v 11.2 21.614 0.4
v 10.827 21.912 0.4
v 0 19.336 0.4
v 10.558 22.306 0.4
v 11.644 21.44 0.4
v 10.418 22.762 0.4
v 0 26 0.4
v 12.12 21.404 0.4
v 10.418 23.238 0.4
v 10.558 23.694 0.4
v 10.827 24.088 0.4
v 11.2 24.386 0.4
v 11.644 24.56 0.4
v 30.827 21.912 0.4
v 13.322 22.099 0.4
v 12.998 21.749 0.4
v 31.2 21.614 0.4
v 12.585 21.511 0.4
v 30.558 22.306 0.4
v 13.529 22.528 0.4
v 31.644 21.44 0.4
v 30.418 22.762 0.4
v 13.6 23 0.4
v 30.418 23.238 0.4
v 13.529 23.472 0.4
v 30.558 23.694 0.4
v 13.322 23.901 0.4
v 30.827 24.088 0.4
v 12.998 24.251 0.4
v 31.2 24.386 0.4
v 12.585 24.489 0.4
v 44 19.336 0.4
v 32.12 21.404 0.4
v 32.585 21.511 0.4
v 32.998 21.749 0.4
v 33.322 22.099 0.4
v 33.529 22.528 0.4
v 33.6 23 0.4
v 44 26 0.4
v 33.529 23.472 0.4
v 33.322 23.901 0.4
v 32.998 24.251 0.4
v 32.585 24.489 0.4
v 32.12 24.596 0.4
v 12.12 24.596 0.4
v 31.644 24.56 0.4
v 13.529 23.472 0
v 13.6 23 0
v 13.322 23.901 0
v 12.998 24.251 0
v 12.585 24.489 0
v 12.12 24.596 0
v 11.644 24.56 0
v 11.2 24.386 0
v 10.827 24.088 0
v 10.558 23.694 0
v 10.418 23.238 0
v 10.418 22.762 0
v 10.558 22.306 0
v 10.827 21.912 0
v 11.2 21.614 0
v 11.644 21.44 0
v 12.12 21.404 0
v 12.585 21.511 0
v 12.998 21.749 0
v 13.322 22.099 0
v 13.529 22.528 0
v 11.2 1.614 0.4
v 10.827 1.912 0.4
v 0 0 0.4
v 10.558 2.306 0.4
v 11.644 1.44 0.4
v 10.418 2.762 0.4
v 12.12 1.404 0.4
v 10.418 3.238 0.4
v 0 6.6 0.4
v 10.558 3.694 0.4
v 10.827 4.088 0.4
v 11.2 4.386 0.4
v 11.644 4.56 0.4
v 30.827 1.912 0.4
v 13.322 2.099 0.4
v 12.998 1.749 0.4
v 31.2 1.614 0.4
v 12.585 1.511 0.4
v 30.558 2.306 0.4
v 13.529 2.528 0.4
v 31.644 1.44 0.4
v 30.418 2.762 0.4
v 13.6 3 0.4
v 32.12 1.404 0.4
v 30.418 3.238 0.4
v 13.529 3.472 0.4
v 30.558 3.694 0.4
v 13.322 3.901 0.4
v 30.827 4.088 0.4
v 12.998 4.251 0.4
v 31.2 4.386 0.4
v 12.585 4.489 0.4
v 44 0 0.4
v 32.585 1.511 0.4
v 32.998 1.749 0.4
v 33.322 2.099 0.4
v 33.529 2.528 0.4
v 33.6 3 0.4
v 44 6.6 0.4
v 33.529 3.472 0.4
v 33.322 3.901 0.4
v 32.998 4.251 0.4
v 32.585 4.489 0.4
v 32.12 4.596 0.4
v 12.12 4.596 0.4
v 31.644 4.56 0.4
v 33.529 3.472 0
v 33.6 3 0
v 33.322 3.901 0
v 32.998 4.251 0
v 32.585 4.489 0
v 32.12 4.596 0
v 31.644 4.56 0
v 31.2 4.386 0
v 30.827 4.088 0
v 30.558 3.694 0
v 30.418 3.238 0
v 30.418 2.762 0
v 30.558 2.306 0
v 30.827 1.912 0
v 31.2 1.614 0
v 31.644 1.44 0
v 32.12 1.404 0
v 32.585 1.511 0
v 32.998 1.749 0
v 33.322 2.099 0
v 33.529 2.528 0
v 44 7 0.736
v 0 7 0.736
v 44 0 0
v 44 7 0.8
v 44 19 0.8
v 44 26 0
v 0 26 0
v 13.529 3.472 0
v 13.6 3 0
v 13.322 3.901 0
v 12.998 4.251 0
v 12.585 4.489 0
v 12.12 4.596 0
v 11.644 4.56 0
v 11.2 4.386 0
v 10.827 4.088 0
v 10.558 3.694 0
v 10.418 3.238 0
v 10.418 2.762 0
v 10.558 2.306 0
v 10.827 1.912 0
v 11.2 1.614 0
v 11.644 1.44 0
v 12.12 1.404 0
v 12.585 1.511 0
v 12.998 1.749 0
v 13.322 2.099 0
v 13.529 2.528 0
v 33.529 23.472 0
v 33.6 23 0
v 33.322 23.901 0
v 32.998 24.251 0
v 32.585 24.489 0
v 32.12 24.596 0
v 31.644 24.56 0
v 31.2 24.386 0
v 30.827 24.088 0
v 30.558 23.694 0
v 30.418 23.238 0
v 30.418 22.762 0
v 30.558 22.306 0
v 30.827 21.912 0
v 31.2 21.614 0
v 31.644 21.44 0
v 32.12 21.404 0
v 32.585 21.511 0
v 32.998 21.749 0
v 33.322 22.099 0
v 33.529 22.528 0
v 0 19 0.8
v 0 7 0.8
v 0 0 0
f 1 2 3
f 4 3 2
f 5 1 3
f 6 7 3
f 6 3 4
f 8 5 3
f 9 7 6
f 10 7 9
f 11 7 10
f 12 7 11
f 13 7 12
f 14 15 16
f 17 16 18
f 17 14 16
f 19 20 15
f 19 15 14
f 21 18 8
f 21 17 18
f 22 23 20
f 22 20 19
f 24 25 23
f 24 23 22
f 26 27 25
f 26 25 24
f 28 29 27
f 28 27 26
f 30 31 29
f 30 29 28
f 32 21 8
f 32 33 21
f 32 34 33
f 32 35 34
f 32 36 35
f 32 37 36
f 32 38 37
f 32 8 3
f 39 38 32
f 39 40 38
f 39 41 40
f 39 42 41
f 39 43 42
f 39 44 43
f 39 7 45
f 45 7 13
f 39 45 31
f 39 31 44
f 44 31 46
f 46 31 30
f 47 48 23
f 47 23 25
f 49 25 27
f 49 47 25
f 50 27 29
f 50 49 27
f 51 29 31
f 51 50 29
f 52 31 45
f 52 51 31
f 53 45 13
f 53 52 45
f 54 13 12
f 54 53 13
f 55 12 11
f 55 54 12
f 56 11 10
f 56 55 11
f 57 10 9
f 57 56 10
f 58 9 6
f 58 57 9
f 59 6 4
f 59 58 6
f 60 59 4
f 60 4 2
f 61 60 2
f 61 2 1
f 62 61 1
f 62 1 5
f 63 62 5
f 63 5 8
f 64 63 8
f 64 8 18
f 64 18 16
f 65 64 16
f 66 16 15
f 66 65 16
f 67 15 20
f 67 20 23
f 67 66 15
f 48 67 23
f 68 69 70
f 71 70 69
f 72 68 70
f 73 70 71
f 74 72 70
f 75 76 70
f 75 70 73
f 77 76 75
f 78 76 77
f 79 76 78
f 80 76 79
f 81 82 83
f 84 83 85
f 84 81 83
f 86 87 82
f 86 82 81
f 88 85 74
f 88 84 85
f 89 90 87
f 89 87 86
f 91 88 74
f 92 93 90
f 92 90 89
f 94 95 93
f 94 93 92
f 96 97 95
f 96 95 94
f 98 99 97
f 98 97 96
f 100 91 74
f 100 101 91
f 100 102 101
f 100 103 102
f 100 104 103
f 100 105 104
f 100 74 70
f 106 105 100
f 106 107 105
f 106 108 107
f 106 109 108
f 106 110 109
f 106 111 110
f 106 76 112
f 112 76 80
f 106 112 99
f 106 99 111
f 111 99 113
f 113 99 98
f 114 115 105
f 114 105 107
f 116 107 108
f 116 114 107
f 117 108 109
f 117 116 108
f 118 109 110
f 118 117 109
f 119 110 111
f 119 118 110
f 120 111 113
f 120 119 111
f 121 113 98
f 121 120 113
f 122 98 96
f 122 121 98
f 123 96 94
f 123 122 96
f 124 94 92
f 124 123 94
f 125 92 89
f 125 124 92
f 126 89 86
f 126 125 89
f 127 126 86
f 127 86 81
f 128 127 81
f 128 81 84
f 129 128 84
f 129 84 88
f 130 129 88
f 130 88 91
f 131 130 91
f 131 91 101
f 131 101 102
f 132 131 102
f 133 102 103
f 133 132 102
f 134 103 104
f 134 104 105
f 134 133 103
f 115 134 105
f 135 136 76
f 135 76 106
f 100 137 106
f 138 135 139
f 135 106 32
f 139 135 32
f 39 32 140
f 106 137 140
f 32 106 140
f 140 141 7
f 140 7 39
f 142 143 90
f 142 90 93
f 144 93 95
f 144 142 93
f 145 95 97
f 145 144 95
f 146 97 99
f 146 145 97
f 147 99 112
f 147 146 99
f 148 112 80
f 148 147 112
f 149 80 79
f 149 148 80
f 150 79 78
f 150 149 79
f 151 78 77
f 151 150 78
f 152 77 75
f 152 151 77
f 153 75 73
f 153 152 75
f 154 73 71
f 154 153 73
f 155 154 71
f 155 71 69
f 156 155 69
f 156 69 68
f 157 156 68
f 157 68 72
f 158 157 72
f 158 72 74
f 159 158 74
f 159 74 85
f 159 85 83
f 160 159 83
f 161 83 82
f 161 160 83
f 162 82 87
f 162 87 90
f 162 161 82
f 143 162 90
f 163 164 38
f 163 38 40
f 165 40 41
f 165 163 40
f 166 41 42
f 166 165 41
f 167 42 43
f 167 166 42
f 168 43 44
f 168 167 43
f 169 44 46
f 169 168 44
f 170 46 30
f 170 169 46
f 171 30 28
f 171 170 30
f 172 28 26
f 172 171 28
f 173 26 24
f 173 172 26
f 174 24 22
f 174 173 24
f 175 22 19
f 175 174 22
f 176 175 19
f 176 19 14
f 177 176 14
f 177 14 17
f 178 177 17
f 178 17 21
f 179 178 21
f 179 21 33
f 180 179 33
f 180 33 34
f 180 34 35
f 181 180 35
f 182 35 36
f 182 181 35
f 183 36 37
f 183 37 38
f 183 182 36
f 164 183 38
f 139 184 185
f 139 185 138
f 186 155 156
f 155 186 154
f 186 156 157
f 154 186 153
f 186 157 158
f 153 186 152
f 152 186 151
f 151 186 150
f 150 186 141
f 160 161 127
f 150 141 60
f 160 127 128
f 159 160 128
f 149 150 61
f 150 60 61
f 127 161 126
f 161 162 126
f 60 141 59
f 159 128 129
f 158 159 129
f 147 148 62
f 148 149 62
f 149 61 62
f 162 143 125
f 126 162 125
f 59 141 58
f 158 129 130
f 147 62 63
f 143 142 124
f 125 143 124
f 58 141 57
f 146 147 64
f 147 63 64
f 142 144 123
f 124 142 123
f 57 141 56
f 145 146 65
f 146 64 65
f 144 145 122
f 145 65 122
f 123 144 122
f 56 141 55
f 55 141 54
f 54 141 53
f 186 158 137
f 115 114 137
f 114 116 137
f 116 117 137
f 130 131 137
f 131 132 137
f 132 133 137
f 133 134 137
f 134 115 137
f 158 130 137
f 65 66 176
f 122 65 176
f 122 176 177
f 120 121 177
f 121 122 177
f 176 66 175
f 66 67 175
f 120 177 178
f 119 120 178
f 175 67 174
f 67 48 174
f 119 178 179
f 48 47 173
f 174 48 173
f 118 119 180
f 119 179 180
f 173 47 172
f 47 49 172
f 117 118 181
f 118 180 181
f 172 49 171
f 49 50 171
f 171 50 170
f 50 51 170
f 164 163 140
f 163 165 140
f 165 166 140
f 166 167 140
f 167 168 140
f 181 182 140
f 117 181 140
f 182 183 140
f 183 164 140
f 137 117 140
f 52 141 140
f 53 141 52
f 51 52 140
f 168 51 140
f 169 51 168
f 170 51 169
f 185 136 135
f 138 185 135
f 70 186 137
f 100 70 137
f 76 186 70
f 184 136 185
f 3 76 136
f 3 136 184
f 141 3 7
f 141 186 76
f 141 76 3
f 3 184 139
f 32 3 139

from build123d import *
from OCP.BRepFilletAPI import BRepFilletAPI_MakeChamfer

# Parameters (mm, degrees)
SKETCH1_W           = 44
SKETCH1_H           = 26
SKETCH1_R           = 1.6
BOSS_EXTRUDE1_DEPTH = 0.4
SKETCH2_W           = 44
SKETCH2_H           = 12
BOSS_EXTRUDE2_DEPTH = 0.4
CHAMFER1_SIZE       = 0.4
CHAMFER1_SIZE_2     = 0.335639852


with BuildPart() as part:
    # Sketch1 → Boss-Extrude1 (new body)
    with BuildSketch(Plane.XY):
        with Locations((22, 13)):
            Rectangle(SKETCH1_W, SKETCH1_H)
        with Locations((32, 3)):
            Circle(SKETCH1_R, mode=Mode.SUBTRACT)
        with Locations((12, 3)):
            Circle(SKETCH1_R, mode=Mode.SUBTRACT)
        with Locations((32, 23)):
            Circle(SKETCH1_R, mode=Mode.SUBTRACT)
        with Locations((12, 23)):
            Circle(SKETCH1_R, mode=Mode.SUBTRACT)
    extrude(amount=BOSS_EXTRUDE1_DEPTH)

    # Sketch2 → Boss-Extrude2 (add)
    with BuildSketch(Plane.XY.offset(0.4)):
        with Locations((22, 13)):
            Rectangle(SKETCH2_W, SKETCH2_H)
    extrude(amount=BOSS_EXTRUDE2_DEPTH)

    # Chamfer1
    chamfer1_edges_1 = [part.edges().sort_by_distance(p)[0] for p in [
        (22, 7, 0.4),
    ]]
    chamfer1_side_1 = [part.faces().sort_by_distance(p)[0] for p in [
        (22, 6.993287203, 0.4),
    ]]
    chamfer1_edges_2 = [part.edges().sort_by_distance(p)[0] for p in [
        (22, 19, 0.4),
    ]]
    chamfer1_side_2 = [part.faces().sort_by_distance(p)[0] for p in [
        (22, 19.006712797, 0.4),
    ]]
    chamfer1 = BRepFilletAPI_MakeChamfer(part.part.solid().wrapped)
    for e in chamfer1_edges_1:
        chamfer1.Add(CHAMFER1_SIZE - 0.0001, CHAMFER1_SIZE_2 - 0.0001, e.wrapped, chamfer1_side_1[0].wrapped)
    for e in chamfer1_edges_2:
        chamfer1.Add(CHAMFER1_SIZE_2 - 0.0001, CHAMFER1_SIZE - 0.0001, e.wrapped, chamfer1_side_2[0].wrapped)
    add(Compound.cast(chamfer1.Shape()), mode=Mode.REPLACE)  # a hair under: the kernel refuses the full size


solid = part.part
